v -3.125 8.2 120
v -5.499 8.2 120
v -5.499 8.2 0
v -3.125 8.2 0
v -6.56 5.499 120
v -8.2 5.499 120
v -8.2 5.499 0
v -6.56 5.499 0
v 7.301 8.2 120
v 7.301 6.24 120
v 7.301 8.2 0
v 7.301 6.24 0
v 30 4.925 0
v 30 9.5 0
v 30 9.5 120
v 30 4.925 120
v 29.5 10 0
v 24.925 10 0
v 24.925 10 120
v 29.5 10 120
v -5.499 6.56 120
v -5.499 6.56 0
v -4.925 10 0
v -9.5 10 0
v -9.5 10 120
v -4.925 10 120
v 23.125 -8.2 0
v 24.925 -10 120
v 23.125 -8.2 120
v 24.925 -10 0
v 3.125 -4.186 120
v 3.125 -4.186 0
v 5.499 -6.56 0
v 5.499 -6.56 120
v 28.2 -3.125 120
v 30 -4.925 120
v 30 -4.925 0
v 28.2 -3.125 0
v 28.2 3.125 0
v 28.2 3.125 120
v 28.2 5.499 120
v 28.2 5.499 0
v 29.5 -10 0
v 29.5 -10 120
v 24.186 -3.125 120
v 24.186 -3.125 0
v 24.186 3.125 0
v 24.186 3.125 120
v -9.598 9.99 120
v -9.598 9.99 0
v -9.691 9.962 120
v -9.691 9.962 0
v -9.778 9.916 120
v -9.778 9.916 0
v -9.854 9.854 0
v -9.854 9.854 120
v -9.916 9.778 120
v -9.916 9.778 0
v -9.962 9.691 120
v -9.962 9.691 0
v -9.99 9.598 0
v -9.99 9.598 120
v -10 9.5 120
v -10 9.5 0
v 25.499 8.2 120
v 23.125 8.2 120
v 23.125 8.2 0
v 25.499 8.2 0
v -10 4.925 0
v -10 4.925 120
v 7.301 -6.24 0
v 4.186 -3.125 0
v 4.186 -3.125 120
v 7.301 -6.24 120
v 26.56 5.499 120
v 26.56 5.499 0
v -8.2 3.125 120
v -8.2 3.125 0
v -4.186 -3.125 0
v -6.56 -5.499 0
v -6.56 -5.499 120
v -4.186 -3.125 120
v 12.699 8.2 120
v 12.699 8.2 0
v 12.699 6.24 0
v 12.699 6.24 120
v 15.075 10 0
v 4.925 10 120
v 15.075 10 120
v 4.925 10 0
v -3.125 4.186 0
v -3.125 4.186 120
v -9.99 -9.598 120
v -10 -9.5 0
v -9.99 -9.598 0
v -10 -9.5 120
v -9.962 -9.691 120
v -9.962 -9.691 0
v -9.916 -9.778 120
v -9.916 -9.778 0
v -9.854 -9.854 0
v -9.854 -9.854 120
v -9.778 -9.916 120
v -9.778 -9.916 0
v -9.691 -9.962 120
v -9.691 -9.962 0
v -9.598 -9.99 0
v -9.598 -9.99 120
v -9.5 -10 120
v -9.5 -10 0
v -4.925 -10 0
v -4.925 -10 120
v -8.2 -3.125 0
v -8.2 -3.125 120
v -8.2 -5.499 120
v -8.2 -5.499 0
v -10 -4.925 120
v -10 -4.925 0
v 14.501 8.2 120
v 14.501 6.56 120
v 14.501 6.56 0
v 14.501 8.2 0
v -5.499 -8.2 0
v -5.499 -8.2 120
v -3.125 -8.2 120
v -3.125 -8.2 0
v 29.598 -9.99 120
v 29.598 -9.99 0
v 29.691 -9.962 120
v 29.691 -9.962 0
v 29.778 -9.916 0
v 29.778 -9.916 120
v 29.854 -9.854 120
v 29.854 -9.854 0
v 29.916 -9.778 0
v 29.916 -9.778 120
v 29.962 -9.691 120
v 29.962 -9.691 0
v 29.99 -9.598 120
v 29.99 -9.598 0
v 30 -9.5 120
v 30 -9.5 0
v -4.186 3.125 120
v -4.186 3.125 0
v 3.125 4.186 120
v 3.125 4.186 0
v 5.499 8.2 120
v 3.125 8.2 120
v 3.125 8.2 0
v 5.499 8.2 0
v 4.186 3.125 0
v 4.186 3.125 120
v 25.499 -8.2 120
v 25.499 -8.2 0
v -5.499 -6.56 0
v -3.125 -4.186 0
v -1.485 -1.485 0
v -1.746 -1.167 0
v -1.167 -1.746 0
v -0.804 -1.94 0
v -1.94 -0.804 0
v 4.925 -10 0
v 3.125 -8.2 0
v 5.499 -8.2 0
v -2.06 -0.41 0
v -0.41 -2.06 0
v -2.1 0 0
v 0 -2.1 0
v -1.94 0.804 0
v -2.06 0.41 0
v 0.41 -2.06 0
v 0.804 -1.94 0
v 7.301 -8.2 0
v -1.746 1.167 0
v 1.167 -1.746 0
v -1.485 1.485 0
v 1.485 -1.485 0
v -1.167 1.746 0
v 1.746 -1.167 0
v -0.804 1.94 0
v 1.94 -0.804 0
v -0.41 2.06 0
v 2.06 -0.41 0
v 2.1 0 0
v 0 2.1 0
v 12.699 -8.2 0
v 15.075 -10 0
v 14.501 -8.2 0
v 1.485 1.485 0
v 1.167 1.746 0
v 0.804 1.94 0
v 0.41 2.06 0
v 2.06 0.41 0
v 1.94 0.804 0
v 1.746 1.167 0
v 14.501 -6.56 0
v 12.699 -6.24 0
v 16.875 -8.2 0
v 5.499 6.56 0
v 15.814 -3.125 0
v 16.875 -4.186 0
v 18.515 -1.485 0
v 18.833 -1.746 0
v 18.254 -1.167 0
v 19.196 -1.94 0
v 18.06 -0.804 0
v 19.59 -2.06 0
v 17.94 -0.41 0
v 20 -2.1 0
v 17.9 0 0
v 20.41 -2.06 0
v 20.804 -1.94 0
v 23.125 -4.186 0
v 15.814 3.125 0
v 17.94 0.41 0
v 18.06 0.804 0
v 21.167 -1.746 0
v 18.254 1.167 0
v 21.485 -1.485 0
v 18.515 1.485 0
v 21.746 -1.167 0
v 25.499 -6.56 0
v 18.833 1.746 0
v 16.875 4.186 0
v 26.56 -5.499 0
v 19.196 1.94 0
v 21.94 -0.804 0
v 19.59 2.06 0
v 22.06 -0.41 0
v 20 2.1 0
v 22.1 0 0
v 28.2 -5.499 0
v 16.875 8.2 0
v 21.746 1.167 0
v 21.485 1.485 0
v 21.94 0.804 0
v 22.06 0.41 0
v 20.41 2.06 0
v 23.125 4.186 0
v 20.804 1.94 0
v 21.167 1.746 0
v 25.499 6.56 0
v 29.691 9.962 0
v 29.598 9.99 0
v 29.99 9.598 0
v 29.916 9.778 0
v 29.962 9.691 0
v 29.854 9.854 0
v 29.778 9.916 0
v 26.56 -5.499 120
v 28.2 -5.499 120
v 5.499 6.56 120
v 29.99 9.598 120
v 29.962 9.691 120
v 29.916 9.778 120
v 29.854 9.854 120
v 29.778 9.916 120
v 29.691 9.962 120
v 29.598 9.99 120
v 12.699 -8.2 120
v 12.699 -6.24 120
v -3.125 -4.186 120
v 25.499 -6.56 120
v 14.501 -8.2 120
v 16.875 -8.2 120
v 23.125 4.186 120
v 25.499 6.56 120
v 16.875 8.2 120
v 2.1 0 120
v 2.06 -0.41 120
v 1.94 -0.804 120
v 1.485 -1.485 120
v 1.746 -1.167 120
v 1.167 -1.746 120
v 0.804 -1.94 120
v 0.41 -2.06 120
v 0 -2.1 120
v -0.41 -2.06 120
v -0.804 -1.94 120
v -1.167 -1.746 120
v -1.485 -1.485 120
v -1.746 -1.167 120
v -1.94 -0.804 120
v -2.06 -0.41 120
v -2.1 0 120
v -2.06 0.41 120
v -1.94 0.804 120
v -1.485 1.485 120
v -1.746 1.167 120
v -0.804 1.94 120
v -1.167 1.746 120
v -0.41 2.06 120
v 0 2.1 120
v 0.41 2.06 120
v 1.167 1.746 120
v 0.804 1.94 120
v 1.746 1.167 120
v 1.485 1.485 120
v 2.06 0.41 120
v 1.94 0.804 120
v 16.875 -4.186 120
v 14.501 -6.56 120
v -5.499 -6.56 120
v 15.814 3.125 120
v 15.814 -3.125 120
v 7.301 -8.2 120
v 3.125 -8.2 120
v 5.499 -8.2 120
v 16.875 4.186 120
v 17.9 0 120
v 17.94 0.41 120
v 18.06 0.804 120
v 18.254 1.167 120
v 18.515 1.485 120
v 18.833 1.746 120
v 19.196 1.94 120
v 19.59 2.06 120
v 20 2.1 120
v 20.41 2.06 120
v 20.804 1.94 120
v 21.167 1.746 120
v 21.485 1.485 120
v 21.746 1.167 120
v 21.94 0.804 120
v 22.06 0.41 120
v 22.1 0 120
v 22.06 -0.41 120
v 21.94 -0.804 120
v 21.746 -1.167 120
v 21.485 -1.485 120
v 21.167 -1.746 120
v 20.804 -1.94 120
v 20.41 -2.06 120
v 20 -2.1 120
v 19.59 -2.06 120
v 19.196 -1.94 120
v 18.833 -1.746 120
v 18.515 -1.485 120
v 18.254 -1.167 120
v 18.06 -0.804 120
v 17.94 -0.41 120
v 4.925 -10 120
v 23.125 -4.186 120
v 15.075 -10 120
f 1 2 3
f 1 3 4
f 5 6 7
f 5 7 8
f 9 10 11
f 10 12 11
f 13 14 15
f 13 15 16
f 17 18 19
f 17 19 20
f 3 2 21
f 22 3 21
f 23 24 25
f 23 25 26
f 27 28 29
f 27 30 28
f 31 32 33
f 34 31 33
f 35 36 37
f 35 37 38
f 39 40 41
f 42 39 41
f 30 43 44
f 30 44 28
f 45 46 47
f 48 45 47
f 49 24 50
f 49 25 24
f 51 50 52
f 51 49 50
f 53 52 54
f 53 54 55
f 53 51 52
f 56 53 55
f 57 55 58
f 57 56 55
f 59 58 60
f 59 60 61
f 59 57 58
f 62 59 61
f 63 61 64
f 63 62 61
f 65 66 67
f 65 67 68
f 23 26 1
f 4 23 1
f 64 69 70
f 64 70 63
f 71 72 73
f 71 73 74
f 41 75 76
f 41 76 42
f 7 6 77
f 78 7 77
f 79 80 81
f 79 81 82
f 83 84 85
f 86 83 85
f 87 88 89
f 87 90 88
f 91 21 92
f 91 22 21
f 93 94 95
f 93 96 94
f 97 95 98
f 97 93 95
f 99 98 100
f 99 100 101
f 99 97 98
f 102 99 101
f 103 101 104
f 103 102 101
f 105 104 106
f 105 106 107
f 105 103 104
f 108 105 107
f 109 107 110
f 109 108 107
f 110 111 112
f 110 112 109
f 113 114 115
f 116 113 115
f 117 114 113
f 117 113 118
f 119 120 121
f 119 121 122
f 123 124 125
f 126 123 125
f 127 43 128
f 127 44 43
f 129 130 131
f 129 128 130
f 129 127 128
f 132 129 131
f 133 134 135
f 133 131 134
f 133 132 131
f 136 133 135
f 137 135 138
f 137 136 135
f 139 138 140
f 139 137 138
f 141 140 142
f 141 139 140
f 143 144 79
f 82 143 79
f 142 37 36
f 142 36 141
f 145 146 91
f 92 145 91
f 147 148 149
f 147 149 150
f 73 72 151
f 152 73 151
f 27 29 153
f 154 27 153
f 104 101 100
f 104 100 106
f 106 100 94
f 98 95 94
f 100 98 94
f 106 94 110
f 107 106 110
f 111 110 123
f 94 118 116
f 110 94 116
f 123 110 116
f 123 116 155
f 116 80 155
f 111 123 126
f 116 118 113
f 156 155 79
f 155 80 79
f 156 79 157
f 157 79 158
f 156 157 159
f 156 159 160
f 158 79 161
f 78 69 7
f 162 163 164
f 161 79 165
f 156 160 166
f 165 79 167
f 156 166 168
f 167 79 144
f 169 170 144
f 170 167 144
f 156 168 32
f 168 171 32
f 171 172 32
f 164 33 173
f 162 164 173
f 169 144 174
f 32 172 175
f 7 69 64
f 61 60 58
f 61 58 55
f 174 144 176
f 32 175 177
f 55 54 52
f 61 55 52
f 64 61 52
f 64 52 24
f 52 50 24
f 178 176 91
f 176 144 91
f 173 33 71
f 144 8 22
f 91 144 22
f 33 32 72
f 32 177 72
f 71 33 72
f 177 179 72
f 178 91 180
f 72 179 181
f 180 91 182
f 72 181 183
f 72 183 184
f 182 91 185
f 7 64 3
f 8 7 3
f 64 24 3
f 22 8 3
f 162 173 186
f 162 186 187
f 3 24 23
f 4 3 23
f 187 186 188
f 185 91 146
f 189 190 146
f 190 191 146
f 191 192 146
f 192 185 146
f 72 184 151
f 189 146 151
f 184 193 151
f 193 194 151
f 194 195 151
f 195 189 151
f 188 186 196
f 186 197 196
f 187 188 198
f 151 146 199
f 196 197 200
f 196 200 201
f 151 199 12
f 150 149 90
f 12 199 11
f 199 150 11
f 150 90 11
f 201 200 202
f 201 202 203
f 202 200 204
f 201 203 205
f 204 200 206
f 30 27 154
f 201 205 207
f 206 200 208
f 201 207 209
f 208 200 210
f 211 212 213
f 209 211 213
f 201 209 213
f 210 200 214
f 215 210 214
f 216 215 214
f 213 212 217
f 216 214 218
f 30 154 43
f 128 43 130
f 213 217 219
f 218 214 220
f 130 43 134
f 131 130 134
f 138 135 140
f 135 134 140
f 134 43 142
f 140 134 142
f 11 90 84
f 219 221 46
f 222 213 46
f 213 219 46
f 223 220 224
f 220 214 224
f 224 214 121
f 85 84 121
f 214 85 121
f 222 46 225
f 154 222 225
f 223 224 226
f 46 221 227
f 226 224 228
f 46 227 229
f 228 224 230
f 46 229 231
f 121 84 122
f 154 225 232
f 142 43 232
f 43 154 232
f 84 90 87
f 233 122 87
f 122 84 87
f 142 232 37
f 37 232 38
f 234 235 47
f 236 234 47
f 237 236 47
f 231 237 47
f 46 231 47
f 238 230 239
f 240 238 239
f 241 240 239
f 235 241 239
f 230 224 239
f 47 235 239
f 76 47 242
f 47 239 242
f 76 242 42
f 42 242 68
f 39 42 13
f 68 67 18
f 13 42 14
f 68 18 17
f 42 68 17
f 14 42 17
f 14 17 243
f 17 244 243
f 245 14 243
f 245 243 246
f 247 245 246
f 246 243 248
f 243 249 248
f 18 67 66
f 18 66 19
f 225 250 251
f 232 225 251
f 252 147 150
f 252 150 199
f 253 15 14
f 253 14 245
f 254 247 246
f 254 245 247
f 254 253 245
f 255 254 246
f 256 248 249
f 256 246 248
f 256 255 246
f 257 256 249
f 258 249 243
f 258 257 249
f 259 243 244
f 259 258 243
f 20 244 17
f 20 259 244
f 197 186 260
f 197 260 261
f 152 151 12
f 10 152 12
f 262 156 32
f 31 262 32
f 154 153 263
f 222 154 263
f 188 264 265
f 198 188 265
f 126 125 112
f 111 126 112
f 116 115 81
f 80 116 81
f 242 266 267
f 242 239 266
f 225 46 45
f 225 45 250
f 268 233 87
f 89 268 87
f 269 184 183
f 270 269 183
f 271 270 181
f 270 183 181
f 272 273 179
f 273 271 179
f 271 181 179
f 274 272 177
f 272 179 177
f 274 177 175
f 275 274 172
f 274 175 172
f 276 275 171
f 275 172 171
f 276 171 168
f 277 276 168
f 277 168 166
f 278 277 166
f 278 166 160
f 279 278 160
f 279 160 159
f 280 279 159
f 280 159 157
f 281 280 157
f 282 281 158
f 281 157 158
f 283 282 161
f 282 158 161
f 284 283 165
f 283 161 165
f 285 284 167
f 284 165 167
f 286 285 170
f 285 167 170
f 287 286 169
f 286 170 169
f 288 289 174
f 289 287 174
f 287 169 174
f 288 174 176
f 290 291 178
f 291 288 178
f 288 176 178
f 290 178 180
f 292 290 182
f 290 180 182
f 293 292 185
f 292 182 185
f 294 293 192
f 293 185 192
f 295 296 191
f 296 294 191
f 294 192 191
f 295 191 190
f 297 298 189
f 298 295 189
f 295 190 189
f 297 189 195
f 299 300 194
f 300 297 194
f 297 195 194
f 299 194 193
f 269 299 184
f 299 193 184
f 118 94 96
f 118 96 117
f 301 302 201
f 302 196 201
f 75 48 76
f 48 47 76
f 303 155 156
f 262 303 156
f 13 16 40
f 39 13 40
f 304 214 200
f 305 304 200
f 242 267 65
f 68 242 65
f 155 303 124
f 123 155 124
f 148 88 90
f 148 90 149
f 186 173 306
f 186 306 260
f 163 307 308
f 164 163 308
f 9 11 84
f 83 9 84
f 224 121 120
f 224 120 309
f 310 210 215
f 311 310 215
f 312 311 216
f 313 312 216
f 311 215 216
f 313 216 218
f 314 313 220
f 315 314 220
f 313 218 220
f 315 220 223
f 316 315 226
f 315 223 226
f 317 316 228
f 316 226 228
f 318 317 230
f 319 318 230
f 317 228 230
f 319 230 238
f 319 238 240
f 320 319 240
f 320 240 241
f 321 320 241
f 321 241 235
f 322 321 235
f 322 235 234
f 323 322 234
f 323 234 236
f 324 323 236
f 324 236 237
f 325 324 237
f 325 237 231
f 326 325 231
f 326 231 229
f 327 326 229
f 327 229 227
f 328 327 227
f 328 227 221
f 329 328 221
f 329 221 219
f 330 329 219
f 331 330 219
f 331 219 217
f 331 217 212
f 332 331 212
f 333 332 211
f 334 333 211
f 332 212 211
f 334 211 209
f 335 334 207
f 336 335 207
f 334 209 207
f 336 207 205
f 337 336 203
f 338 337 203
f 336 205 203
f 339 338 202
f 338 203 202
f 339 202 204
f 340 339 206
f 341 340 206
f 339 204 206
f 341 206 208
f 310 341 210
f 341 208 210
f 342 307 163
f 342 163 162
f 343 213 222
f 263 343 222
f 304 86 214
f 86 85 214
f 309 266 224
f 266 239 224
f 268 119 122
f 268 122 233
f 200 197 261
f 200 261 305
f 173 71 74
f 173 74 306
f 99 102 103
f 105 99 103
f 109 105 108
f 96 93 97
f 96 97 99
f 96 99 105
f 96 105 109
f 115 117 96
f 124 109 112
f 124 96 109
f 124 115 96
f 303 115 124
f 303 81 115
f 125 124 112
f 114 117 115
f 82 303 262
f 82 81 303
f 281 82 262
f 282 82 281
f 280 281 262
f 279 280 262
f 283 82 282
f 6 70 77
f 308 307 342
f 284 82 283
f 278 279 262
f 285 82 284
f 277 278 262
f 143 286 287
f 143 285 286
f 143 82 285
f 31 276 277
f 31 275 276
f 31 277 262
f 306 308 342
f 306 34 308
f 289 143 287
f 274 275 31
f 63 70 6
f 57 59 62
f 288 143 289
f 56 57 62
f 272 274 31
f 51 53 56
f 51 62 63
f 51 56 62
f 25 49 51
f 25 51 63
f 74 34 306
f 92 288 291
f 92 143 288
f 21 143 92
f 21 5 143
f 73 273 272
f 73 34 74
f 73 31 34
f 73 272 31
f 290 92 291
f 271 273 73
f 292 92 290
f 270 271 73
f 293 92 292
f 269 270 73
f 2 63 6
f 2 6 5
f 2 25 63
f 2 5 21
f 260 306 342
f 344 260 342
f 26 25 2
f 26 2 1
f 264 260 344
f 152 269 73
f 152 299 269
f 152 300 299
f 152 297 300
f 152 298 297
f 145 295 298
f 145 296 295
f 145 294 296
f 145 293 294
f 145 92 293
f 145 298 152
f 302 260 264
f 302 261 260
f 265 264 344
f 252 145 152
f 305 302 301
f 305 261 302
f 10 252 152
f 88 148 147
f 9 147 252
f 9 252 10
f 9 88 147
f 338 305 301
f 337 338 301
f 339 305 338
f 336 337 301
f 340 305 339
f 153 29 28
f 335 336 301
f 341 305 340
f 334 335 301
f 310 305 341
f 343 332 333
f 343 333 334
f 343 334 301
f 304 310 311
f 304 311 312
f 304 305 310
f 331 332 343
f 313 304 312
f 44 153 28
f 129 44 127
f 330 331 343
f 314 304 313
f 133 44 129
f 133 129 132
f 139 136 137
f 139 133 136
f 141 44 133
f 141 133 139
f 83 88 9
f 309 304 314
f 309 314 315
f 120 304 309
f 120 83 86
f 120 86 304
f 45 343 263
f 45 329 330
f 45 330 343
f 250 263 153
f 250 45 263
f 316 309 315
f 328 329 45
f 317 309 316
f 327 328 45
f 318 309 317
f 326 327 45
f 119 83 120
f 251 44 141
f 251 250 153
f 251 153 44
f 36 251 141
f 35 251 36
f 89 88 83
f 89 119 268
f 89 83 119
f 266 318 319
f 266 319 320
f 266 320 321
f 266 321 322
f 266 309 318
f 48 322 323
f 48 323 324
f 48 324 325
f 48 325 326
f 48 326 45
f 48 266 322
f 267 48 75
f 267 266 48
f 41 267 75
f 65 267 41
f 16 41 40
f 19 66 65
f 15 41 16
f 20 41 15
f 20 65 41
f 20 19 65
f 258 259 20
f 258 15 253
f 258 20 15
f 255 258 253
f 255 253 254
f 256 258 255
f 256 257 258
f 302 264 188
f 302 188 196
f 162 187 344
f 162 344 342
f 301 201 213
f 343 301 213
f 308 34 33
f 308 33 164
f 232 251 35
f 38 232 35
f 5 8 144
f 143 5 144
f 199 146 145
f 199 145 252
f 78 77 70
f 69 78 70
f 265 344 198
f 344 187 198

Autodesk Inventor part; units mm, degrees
ref_plane "YZ Plane" through (0, 0, 0) normal (1, 0, 0) x (0, 1, 0)
ref_plane "XZ Plane" through (0, 0, 0) normal (0, 1, 0) x (-1, 0, 0)
sketch "Szkic1" plane through (0, 0, 0) normal (0, 0, 1) x (1, 0, 0)
  circle A0 centre (0, 0) radius 2.1
  line L0 (-10, 10) -> (10, 10)
  line L1 (10, 10) -> (10, -10)
  line L2 (10, -10) -> (-10, -10)
  line L3 (-10, -10) -> (-10, 10)
  line L4 (-10, -10) -> (10, 10) construction
  line L5 (10, -10) -> (-10, 10) construction
  line L6 (-10, 8.2) -> (10, 8.2)
  line L7 (-10, -8.2) -> (10, -8.2)
  line L8 (-8.2, 10) -> (-8.2, -10)
  line L9 (10, 10) -> (30, 10)
  line L10 (30, 10) -> (30, -10)
  line L11 (30, -10) -> (10, -10)
  line L12 (10, -10) -> (10, 10)
  line L13 (-4.1857, -4.1857) -> (4.1857, -4.1857)
  line L14 (4.1857, -4.1857) -> (4.1857, 4.1857)
  line L15 (4.1857, 4.1857) -> (-4.1857, 4.1857)
  line L16 (-4.1857, 4.1857) -> (-4.1857, -4.1857)
  line L17 (-8.2, 7.1393) -> (-4.1857, 3.125)
  line L18 (-7.1393, 8.2) -> (-3.125, 4.1857)
  line L19 (-4.925, 10) -> (-3.125, 8.2)
  line L20 (4.925, 10) -> (3.125, 8.2)
  line L21 (-3.125, -8.2) -> (-4.925, -10)
  line L22 (3.125, -8.2) -> (4.925, -10)
  line L23 (-8.2, -7.1393) -> (-4.1857, -3.125)
  line L24 (-7.1393, -8.2) -> (-3.125, -4.1857)
  line L25 (3.125, -4.1857) -> (7.1393, -8.2)
  line L26 (4.1857, -3.125) -> (7.3007, -6.24)
  line L27 (4.1857, 3.125) -> (7.3007, 6.24)
  line L28 (3.125, 4.1857) -> (7.1393, 8.2)
  line L29 (-5.4993, 8.2) -> (-5.4993, 6.56)
  line L30 (5.4993, 8.2) -> (5.4993, 6.56)
  line L31 (-8.2, 5.4993) -> (-6.56, 5.4993)
  line L32 (-8.2, -5.4993) -> (-6.56, -5.4993)
  line L33 (-5.4993, -6.56) -> (-5.4993, -8.2)
  line L34 (5.4993, -6.56) -> (5.4993, -8.2)
  line L35 (-8.2, 3.125) -> (-10, 4.925)
  line L36 (-8.2, -3.125) -> (-10, -4.925)
  line L37 (7.3007, 6.24) -> (7.3007, 8.2)
  line L38 (7.3007, -6.24) -> (7.3007, -8.2)
  point P0 (0, -8.2)
  point P1 (-8.2, -8.2)
  point P2 (-8.2, 8.2)
  dimension "d0" = 4.2
  dimension "d1" = 20
  dimension "d2" = 1.8
  dimension "d4" = 20
  dimension "d5" = 20
  dimension "d6" = 1.8
  dimension "d7" = 1.8
  dimension "d8" = 1.5
  dimension "d9" = 0.75
  dimension "d10" = 135
  dimension "d11" = 6.25
  dimension "d12" = 3.125
  dimension "d13" = 1.5
  dimension "d14" = 1.5
  dimension "d15" = 1.5
  dimension "d16" = 0.75
  dimension "d17" = 0.75
  dimension "d18" = 0.75
  dimension "d19" = 1.64
  dimension "d20" = 1.64
  dimension "d21" = 1.64
  dimension "d22" = 1.64
  dimension "d23" = 1.64
  dimension "d24" = 1.64
  dimension "d25" = 45
  dimension "d30" = 1.96
  dimension "d31" = 1.96
extrude "Wyciągnięcie proste1" add sketch "Szkic1" along normal blind 120 contours L0 L8 L6 L3 | L0 L19 L6 L8 | L6 L8 L35 L3 | L6 L18 L15 L16 L17 L8 | L0 L1 L6 L20 | L6 L29 L18 | L17 L31 L8 | L36 L8 L7 L3 | L7 L8 L2 L3 | L6 L28 L30 | L15 L14 L13 L16 | L8 L23 L16 L13 L24 L7 | L7 L21 L2 L8 | L32 L23 L8 | L1 L2 L22 L7 | L37 L27 L14 L15 L28 L6 | L24 L33 L7 | L7 L25 L13 L14 L26 L38 | L7 L34 L25
ref_plane "Płaszczyzna konstrukcyjna1" through (10, 8.2, 0) normal (1, 0, 0) x (0, 0, -1)
mirror "Odbij1" about plane through (10, 8.2, 0) normal (1, 0, 0) of "Wyciągnięcie proste1"
fillet "Zaokrąglenie1" radius 0.5 4 edges at (-10, 10, 60) (-10, -10, 60) (30, 10, 60) (30, -10, 60)
properties part number "2040vslot_short"
